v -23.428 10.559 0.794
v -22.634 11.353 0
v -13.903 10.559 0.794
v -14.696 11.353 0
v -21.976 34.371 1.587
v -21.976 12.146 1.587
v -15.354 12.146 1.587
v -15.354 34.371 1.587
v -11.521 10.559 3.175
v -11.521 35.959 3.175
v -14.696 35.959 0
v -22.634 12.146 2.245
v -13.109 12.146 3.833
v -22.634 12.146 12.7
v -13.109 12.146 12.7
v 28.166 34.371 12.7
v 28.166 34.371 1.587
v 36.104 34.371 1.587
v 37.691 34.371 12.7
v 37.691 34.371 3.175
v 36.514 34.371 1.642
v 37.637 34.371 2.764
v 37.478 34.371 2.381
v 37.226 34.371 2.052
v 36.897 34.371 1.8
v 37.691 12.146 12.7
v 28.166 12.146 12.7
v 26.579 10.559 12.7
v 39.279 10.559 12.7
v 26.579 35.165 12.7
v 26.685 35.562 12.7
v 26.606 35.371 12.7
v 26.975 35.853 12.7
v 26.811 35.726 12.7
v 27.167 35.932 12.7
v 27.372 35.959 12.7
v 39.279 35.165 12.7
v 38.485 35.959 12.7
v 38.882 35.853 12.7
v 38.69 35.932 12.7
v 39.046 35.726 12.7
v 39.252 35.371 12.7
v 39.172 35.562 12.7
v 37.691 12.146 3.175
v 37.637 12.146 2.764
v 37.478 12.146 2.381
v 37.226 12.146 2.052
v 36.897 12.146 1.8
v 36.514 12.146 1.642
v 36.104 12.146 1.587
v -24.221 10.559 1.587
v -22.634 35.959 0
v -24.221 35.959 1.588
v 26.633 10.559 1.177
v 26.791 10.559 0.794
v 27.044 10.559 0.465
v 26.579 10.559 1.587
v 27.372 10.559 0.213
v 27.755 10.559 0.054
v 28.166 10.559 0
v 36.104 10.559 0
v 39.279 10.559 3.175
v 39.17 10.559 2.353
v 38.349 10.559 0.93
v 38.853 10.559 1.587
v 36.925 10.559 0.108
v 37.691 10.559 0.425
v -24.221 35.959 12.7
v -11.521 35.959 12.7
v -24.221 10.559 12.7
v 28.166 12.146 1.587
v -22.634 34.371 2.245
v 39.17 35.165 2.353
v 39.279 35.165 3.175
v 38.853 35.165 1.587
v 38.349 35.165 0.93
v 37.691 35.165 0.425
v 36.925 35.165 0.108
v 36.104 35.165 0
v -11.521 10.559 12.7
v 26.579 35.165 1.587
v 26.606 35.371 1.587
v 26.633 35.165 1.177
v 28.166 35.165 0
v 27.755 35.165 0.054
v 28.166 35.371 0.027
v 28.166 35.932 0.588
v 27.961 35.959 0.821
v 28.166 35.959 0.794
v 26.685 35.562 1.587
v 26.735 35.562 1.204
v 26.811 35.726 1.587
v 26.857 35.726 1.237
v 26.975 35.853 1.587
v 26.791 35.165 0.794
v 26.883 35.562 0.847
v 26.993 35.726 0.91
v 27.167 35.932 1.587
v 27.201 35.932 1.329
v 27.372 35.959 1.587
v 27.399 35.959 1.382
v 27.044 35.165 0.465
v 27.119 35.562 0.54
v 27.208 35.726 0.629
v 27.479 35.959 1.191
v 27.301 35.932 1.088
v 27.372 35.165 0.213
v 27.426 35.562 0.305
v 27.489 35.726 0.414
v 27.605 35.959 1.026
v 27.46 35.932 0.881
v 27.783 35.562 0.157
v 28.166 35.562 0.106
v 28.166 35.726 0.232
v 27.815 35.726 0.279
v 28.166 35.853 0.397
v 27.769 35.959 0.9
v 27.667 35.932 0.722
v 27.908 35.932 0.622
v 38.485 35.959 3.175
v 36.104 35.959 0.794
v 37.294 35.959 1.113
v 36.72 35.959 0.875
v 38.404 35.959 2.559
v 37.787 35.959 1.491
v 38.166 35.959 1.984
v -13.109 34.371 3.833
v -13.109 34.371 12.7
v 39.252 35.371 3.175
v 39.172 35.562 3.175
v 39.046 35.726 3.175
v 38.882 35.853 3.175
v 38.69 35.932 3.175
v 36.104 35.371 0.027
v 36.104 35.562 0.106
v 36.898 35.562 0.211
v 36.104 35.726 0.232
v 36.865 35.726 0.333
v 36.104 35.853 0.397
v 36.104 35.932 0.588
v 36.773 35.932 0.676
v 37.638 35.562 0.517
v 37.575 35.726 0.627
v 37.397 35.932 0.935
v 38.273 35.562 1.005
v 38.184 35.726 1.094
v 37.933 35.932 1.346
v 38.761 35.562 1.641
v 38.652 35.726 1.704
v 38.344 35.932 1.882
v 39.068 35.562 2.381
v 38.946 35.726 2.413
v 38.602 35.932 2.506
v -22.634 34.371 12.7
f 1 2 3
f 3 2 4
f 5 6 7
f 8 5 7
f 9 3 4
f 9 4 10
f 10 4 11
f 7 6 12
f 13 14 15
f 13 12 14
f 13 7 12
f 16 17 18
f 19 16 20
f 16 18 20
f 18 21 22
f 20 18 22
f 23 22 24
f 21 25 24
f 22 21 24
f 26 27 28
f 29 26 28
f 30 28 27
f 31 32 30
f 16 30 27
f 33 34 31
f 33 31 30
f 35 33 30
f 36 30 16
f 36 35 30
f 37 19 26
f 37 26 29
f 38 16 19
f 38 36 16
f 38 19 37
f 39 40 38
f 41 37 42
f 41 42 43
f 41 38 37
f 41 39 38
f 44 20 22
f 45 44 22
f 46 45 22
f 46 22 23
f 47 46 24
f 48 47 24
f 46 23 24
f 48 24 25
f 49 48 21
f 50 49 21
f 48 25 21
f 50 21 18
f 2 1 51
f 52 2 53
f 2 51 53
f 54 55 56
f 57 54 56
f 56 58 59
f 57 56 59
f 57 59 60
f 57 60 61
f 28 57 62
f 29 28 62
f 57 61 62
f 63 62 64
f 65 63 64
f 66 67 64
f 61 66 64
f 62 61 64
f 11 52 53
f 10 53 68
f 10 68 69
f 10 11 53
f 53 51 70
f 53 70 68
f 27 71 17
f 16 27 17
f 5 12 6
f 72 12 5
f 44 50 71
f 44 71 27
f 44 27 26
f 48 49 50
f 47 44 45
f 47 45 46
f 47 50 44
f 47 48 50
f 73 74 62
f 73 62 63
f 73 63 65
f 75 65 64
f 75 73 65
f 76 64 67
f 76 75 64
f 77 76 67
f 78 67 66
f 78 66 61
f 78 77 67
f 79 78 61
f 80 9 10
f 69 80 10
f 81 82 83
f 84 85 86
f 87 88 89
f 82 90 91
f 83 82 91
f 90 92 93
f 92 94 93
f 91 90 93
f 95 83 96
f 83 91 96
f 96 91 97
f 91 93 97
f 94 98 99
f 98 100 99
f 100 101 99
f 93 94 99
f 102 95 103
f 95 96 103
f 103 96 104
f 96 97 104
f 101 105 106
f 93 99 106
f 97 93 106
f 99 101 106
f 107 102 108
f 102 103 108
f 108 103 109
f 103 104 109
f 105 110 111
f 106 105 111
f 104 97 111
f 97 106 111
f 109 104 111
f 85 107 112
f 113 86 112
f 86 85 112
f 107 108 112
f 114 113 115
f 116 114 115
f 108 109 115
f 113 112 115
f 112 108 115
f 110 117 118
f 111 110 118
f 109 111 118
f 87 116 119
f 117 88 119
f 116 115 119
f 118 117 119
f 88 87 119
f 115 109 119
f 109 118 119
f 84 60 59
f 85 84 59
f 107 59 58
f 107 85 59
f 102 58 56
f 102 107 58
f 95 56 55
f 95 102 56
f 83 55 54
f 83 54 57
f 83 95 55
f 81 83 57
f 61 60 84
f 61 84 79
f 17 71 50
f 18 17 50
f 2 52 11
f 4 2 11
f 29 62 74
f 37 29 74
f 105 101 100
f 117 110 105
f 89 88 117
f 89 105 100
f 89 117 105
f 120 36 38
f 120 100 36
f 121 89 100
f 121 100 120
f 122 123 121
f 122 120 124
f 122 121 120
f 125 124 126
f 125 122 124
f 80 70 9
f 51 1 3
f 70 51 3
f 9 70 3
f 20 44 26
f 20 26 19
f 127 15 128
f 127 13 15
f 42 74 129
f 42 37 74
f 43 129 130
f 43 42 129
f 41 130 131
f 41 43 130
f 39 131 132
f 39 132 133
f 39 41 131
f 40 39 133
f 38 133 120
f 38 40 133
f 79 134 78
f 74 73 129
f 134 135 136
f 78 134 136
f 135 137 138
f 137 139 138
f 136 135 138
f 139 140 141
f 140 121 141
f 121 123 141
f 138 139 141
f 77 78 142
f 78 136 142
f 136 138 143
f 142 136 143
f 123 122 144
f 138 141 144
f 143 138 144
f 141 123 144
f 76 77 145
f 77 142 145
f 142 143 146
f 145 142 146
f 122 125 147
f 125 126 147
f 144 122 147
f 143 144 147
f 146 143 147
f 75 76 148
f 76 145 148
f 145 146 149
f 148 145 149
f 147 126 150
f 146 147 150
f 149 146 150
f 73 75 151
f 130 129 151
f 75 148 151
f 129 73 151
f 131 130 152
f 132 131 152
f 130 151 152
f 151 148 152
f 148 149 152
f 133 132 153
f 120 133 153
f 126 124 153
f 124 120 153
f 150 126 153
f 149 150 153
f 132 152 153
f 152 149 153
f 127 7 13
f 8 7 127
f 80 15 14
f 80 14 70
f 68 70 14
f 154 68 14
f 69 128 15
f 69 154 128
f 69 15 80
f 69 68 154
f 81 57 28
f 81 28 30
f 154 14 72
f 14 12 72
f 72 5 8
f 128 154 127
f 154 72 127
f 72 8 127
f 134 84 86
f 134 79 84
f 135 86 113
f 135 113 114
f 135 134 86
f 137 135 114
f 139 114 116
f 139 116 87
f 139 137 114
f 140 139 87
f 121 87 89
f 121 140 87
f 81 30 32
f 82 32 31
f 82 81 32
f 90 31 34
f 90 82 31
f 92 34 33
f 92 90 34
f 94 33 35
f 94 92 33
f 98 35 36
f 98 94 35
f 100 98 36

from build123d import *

# Parameters (mm, degrees)
F0_W     = 12.7
F0_H     = 25.4
F1_DEPTH = 12.7
F3_SIZE  = 3.175
F4_SIZE  = 1.5875
F5_SIZE  = 0.79375
F6_T     = -1.5875
F7_R     = 3.175
F8_R     = 1.5875
F9_R     = 0.79375
F10_T    = 1.5875


# Not quite as in the source:
# - a shell that OpenCascade refuses in one call is made with other operations: the cavity is built on its own and cut out


with BuildPart() as f1:
    # F0 (on Top) → F1 (new body)
    with BuildSketch(Plane.XY):
        with Locations((-17.8713803947, 23.258962822)):
            Rectangle(F0_W, F0_H)
    extrude(amount=F1_DEPTH)


with BuildPart() as f2_1:
    # F2: copy of F1
    add(f1.part.moved(Location((50.8, 0, 0))))

    # F7
    f7_edges = [f2_1.edges().sort_by_distance(p)[0] for p in [
        (39.27862, 23.258963, 0),
    ]]
    fillet(f7_edges, radius=F7_R)

    # F8
    f8_edges = [f2_1.edges().sort_by_distance(p)[0] for p in [
        (26.57862, 23.258963, 0),
    ]]
    fillet(f8_edges, radius=F8_R)

    # F9
    f9_edges = [f2_1.edges().sort_by_distance(p)[0] for p in [
        (32.13487, 35.958963, 0),
    ]]
    fillet(f9_edges, radius=F9_R)

    # F10: shell of thickness 1.5875, made by hand


with BuildPart() as f1_1:
    add(f1.part)

    # F3
    f3_edges = [f1_1.edges().sort_by_distance(p)[0] for p in [
        (-11.52138, 23.258963, 0),
    ]]
    chamfer(f3_edges, length=F3_SIZE)

    # F4
    f4_edges = [f1_1.edges().sort_by_distance(p)[0] for p in [
        (-24.22138, 23.258963, 0),
    ]]
    chamfer(f4_edges, length=F4_SIZE)

    # F5
    f5_edges = [f1_1.edges().sort_by_distance(p)[0] for p in [
        (-18.66513, 10.558963, 0),
    ]]
    chamfer(f5_edges, length=F5_SIZE)

    # F6
    f6_openings = [f1_1.faces().sort_by_distance(p)[0] for p in [
        (-17.87138, 23.258963, 12.7),
    ]]
    offset(amount=F6_T, openings=f6_openings)


with BuildPart() as f10_core1:
    # F10_t2: copy of F2_1
    add(f2_1.part)

    # the walls: a layer under each face that stays
    f10_faces = [f10_core1.faces().sort_by_distance(p)[0] for p in [
        (32.9286196053, 35.958962822, 6.746875),
        (39.2786196053, 22.862087822, 7.9375),
        (26.5786196053, 22.862087822, 7.14375),
        (32.9286196053, 10.558962822, 6.35),
        (38.3486836356, 22.862087822, 0.9299359697),
        (32.1348696053, 22.862087822, 0),
    ]]
    thicken(f10_faces, amount=-F10_T, mode=Mode.SUBTRACT)


with BuildPart() as f2_1_1:
    add(f2_1.part)

    # what is left inside the walls is the cavity
    f10_cavity = [f10_core1.part.solids().sort_by_distance(p)[0] for p in [
        (28.181995, 23.258963, 8.995833),
    ]]
    add(f10_cavity, mode=Mode.SUBTRACT)


solid = Compound([f1_1.part, f2_1_1.part])
